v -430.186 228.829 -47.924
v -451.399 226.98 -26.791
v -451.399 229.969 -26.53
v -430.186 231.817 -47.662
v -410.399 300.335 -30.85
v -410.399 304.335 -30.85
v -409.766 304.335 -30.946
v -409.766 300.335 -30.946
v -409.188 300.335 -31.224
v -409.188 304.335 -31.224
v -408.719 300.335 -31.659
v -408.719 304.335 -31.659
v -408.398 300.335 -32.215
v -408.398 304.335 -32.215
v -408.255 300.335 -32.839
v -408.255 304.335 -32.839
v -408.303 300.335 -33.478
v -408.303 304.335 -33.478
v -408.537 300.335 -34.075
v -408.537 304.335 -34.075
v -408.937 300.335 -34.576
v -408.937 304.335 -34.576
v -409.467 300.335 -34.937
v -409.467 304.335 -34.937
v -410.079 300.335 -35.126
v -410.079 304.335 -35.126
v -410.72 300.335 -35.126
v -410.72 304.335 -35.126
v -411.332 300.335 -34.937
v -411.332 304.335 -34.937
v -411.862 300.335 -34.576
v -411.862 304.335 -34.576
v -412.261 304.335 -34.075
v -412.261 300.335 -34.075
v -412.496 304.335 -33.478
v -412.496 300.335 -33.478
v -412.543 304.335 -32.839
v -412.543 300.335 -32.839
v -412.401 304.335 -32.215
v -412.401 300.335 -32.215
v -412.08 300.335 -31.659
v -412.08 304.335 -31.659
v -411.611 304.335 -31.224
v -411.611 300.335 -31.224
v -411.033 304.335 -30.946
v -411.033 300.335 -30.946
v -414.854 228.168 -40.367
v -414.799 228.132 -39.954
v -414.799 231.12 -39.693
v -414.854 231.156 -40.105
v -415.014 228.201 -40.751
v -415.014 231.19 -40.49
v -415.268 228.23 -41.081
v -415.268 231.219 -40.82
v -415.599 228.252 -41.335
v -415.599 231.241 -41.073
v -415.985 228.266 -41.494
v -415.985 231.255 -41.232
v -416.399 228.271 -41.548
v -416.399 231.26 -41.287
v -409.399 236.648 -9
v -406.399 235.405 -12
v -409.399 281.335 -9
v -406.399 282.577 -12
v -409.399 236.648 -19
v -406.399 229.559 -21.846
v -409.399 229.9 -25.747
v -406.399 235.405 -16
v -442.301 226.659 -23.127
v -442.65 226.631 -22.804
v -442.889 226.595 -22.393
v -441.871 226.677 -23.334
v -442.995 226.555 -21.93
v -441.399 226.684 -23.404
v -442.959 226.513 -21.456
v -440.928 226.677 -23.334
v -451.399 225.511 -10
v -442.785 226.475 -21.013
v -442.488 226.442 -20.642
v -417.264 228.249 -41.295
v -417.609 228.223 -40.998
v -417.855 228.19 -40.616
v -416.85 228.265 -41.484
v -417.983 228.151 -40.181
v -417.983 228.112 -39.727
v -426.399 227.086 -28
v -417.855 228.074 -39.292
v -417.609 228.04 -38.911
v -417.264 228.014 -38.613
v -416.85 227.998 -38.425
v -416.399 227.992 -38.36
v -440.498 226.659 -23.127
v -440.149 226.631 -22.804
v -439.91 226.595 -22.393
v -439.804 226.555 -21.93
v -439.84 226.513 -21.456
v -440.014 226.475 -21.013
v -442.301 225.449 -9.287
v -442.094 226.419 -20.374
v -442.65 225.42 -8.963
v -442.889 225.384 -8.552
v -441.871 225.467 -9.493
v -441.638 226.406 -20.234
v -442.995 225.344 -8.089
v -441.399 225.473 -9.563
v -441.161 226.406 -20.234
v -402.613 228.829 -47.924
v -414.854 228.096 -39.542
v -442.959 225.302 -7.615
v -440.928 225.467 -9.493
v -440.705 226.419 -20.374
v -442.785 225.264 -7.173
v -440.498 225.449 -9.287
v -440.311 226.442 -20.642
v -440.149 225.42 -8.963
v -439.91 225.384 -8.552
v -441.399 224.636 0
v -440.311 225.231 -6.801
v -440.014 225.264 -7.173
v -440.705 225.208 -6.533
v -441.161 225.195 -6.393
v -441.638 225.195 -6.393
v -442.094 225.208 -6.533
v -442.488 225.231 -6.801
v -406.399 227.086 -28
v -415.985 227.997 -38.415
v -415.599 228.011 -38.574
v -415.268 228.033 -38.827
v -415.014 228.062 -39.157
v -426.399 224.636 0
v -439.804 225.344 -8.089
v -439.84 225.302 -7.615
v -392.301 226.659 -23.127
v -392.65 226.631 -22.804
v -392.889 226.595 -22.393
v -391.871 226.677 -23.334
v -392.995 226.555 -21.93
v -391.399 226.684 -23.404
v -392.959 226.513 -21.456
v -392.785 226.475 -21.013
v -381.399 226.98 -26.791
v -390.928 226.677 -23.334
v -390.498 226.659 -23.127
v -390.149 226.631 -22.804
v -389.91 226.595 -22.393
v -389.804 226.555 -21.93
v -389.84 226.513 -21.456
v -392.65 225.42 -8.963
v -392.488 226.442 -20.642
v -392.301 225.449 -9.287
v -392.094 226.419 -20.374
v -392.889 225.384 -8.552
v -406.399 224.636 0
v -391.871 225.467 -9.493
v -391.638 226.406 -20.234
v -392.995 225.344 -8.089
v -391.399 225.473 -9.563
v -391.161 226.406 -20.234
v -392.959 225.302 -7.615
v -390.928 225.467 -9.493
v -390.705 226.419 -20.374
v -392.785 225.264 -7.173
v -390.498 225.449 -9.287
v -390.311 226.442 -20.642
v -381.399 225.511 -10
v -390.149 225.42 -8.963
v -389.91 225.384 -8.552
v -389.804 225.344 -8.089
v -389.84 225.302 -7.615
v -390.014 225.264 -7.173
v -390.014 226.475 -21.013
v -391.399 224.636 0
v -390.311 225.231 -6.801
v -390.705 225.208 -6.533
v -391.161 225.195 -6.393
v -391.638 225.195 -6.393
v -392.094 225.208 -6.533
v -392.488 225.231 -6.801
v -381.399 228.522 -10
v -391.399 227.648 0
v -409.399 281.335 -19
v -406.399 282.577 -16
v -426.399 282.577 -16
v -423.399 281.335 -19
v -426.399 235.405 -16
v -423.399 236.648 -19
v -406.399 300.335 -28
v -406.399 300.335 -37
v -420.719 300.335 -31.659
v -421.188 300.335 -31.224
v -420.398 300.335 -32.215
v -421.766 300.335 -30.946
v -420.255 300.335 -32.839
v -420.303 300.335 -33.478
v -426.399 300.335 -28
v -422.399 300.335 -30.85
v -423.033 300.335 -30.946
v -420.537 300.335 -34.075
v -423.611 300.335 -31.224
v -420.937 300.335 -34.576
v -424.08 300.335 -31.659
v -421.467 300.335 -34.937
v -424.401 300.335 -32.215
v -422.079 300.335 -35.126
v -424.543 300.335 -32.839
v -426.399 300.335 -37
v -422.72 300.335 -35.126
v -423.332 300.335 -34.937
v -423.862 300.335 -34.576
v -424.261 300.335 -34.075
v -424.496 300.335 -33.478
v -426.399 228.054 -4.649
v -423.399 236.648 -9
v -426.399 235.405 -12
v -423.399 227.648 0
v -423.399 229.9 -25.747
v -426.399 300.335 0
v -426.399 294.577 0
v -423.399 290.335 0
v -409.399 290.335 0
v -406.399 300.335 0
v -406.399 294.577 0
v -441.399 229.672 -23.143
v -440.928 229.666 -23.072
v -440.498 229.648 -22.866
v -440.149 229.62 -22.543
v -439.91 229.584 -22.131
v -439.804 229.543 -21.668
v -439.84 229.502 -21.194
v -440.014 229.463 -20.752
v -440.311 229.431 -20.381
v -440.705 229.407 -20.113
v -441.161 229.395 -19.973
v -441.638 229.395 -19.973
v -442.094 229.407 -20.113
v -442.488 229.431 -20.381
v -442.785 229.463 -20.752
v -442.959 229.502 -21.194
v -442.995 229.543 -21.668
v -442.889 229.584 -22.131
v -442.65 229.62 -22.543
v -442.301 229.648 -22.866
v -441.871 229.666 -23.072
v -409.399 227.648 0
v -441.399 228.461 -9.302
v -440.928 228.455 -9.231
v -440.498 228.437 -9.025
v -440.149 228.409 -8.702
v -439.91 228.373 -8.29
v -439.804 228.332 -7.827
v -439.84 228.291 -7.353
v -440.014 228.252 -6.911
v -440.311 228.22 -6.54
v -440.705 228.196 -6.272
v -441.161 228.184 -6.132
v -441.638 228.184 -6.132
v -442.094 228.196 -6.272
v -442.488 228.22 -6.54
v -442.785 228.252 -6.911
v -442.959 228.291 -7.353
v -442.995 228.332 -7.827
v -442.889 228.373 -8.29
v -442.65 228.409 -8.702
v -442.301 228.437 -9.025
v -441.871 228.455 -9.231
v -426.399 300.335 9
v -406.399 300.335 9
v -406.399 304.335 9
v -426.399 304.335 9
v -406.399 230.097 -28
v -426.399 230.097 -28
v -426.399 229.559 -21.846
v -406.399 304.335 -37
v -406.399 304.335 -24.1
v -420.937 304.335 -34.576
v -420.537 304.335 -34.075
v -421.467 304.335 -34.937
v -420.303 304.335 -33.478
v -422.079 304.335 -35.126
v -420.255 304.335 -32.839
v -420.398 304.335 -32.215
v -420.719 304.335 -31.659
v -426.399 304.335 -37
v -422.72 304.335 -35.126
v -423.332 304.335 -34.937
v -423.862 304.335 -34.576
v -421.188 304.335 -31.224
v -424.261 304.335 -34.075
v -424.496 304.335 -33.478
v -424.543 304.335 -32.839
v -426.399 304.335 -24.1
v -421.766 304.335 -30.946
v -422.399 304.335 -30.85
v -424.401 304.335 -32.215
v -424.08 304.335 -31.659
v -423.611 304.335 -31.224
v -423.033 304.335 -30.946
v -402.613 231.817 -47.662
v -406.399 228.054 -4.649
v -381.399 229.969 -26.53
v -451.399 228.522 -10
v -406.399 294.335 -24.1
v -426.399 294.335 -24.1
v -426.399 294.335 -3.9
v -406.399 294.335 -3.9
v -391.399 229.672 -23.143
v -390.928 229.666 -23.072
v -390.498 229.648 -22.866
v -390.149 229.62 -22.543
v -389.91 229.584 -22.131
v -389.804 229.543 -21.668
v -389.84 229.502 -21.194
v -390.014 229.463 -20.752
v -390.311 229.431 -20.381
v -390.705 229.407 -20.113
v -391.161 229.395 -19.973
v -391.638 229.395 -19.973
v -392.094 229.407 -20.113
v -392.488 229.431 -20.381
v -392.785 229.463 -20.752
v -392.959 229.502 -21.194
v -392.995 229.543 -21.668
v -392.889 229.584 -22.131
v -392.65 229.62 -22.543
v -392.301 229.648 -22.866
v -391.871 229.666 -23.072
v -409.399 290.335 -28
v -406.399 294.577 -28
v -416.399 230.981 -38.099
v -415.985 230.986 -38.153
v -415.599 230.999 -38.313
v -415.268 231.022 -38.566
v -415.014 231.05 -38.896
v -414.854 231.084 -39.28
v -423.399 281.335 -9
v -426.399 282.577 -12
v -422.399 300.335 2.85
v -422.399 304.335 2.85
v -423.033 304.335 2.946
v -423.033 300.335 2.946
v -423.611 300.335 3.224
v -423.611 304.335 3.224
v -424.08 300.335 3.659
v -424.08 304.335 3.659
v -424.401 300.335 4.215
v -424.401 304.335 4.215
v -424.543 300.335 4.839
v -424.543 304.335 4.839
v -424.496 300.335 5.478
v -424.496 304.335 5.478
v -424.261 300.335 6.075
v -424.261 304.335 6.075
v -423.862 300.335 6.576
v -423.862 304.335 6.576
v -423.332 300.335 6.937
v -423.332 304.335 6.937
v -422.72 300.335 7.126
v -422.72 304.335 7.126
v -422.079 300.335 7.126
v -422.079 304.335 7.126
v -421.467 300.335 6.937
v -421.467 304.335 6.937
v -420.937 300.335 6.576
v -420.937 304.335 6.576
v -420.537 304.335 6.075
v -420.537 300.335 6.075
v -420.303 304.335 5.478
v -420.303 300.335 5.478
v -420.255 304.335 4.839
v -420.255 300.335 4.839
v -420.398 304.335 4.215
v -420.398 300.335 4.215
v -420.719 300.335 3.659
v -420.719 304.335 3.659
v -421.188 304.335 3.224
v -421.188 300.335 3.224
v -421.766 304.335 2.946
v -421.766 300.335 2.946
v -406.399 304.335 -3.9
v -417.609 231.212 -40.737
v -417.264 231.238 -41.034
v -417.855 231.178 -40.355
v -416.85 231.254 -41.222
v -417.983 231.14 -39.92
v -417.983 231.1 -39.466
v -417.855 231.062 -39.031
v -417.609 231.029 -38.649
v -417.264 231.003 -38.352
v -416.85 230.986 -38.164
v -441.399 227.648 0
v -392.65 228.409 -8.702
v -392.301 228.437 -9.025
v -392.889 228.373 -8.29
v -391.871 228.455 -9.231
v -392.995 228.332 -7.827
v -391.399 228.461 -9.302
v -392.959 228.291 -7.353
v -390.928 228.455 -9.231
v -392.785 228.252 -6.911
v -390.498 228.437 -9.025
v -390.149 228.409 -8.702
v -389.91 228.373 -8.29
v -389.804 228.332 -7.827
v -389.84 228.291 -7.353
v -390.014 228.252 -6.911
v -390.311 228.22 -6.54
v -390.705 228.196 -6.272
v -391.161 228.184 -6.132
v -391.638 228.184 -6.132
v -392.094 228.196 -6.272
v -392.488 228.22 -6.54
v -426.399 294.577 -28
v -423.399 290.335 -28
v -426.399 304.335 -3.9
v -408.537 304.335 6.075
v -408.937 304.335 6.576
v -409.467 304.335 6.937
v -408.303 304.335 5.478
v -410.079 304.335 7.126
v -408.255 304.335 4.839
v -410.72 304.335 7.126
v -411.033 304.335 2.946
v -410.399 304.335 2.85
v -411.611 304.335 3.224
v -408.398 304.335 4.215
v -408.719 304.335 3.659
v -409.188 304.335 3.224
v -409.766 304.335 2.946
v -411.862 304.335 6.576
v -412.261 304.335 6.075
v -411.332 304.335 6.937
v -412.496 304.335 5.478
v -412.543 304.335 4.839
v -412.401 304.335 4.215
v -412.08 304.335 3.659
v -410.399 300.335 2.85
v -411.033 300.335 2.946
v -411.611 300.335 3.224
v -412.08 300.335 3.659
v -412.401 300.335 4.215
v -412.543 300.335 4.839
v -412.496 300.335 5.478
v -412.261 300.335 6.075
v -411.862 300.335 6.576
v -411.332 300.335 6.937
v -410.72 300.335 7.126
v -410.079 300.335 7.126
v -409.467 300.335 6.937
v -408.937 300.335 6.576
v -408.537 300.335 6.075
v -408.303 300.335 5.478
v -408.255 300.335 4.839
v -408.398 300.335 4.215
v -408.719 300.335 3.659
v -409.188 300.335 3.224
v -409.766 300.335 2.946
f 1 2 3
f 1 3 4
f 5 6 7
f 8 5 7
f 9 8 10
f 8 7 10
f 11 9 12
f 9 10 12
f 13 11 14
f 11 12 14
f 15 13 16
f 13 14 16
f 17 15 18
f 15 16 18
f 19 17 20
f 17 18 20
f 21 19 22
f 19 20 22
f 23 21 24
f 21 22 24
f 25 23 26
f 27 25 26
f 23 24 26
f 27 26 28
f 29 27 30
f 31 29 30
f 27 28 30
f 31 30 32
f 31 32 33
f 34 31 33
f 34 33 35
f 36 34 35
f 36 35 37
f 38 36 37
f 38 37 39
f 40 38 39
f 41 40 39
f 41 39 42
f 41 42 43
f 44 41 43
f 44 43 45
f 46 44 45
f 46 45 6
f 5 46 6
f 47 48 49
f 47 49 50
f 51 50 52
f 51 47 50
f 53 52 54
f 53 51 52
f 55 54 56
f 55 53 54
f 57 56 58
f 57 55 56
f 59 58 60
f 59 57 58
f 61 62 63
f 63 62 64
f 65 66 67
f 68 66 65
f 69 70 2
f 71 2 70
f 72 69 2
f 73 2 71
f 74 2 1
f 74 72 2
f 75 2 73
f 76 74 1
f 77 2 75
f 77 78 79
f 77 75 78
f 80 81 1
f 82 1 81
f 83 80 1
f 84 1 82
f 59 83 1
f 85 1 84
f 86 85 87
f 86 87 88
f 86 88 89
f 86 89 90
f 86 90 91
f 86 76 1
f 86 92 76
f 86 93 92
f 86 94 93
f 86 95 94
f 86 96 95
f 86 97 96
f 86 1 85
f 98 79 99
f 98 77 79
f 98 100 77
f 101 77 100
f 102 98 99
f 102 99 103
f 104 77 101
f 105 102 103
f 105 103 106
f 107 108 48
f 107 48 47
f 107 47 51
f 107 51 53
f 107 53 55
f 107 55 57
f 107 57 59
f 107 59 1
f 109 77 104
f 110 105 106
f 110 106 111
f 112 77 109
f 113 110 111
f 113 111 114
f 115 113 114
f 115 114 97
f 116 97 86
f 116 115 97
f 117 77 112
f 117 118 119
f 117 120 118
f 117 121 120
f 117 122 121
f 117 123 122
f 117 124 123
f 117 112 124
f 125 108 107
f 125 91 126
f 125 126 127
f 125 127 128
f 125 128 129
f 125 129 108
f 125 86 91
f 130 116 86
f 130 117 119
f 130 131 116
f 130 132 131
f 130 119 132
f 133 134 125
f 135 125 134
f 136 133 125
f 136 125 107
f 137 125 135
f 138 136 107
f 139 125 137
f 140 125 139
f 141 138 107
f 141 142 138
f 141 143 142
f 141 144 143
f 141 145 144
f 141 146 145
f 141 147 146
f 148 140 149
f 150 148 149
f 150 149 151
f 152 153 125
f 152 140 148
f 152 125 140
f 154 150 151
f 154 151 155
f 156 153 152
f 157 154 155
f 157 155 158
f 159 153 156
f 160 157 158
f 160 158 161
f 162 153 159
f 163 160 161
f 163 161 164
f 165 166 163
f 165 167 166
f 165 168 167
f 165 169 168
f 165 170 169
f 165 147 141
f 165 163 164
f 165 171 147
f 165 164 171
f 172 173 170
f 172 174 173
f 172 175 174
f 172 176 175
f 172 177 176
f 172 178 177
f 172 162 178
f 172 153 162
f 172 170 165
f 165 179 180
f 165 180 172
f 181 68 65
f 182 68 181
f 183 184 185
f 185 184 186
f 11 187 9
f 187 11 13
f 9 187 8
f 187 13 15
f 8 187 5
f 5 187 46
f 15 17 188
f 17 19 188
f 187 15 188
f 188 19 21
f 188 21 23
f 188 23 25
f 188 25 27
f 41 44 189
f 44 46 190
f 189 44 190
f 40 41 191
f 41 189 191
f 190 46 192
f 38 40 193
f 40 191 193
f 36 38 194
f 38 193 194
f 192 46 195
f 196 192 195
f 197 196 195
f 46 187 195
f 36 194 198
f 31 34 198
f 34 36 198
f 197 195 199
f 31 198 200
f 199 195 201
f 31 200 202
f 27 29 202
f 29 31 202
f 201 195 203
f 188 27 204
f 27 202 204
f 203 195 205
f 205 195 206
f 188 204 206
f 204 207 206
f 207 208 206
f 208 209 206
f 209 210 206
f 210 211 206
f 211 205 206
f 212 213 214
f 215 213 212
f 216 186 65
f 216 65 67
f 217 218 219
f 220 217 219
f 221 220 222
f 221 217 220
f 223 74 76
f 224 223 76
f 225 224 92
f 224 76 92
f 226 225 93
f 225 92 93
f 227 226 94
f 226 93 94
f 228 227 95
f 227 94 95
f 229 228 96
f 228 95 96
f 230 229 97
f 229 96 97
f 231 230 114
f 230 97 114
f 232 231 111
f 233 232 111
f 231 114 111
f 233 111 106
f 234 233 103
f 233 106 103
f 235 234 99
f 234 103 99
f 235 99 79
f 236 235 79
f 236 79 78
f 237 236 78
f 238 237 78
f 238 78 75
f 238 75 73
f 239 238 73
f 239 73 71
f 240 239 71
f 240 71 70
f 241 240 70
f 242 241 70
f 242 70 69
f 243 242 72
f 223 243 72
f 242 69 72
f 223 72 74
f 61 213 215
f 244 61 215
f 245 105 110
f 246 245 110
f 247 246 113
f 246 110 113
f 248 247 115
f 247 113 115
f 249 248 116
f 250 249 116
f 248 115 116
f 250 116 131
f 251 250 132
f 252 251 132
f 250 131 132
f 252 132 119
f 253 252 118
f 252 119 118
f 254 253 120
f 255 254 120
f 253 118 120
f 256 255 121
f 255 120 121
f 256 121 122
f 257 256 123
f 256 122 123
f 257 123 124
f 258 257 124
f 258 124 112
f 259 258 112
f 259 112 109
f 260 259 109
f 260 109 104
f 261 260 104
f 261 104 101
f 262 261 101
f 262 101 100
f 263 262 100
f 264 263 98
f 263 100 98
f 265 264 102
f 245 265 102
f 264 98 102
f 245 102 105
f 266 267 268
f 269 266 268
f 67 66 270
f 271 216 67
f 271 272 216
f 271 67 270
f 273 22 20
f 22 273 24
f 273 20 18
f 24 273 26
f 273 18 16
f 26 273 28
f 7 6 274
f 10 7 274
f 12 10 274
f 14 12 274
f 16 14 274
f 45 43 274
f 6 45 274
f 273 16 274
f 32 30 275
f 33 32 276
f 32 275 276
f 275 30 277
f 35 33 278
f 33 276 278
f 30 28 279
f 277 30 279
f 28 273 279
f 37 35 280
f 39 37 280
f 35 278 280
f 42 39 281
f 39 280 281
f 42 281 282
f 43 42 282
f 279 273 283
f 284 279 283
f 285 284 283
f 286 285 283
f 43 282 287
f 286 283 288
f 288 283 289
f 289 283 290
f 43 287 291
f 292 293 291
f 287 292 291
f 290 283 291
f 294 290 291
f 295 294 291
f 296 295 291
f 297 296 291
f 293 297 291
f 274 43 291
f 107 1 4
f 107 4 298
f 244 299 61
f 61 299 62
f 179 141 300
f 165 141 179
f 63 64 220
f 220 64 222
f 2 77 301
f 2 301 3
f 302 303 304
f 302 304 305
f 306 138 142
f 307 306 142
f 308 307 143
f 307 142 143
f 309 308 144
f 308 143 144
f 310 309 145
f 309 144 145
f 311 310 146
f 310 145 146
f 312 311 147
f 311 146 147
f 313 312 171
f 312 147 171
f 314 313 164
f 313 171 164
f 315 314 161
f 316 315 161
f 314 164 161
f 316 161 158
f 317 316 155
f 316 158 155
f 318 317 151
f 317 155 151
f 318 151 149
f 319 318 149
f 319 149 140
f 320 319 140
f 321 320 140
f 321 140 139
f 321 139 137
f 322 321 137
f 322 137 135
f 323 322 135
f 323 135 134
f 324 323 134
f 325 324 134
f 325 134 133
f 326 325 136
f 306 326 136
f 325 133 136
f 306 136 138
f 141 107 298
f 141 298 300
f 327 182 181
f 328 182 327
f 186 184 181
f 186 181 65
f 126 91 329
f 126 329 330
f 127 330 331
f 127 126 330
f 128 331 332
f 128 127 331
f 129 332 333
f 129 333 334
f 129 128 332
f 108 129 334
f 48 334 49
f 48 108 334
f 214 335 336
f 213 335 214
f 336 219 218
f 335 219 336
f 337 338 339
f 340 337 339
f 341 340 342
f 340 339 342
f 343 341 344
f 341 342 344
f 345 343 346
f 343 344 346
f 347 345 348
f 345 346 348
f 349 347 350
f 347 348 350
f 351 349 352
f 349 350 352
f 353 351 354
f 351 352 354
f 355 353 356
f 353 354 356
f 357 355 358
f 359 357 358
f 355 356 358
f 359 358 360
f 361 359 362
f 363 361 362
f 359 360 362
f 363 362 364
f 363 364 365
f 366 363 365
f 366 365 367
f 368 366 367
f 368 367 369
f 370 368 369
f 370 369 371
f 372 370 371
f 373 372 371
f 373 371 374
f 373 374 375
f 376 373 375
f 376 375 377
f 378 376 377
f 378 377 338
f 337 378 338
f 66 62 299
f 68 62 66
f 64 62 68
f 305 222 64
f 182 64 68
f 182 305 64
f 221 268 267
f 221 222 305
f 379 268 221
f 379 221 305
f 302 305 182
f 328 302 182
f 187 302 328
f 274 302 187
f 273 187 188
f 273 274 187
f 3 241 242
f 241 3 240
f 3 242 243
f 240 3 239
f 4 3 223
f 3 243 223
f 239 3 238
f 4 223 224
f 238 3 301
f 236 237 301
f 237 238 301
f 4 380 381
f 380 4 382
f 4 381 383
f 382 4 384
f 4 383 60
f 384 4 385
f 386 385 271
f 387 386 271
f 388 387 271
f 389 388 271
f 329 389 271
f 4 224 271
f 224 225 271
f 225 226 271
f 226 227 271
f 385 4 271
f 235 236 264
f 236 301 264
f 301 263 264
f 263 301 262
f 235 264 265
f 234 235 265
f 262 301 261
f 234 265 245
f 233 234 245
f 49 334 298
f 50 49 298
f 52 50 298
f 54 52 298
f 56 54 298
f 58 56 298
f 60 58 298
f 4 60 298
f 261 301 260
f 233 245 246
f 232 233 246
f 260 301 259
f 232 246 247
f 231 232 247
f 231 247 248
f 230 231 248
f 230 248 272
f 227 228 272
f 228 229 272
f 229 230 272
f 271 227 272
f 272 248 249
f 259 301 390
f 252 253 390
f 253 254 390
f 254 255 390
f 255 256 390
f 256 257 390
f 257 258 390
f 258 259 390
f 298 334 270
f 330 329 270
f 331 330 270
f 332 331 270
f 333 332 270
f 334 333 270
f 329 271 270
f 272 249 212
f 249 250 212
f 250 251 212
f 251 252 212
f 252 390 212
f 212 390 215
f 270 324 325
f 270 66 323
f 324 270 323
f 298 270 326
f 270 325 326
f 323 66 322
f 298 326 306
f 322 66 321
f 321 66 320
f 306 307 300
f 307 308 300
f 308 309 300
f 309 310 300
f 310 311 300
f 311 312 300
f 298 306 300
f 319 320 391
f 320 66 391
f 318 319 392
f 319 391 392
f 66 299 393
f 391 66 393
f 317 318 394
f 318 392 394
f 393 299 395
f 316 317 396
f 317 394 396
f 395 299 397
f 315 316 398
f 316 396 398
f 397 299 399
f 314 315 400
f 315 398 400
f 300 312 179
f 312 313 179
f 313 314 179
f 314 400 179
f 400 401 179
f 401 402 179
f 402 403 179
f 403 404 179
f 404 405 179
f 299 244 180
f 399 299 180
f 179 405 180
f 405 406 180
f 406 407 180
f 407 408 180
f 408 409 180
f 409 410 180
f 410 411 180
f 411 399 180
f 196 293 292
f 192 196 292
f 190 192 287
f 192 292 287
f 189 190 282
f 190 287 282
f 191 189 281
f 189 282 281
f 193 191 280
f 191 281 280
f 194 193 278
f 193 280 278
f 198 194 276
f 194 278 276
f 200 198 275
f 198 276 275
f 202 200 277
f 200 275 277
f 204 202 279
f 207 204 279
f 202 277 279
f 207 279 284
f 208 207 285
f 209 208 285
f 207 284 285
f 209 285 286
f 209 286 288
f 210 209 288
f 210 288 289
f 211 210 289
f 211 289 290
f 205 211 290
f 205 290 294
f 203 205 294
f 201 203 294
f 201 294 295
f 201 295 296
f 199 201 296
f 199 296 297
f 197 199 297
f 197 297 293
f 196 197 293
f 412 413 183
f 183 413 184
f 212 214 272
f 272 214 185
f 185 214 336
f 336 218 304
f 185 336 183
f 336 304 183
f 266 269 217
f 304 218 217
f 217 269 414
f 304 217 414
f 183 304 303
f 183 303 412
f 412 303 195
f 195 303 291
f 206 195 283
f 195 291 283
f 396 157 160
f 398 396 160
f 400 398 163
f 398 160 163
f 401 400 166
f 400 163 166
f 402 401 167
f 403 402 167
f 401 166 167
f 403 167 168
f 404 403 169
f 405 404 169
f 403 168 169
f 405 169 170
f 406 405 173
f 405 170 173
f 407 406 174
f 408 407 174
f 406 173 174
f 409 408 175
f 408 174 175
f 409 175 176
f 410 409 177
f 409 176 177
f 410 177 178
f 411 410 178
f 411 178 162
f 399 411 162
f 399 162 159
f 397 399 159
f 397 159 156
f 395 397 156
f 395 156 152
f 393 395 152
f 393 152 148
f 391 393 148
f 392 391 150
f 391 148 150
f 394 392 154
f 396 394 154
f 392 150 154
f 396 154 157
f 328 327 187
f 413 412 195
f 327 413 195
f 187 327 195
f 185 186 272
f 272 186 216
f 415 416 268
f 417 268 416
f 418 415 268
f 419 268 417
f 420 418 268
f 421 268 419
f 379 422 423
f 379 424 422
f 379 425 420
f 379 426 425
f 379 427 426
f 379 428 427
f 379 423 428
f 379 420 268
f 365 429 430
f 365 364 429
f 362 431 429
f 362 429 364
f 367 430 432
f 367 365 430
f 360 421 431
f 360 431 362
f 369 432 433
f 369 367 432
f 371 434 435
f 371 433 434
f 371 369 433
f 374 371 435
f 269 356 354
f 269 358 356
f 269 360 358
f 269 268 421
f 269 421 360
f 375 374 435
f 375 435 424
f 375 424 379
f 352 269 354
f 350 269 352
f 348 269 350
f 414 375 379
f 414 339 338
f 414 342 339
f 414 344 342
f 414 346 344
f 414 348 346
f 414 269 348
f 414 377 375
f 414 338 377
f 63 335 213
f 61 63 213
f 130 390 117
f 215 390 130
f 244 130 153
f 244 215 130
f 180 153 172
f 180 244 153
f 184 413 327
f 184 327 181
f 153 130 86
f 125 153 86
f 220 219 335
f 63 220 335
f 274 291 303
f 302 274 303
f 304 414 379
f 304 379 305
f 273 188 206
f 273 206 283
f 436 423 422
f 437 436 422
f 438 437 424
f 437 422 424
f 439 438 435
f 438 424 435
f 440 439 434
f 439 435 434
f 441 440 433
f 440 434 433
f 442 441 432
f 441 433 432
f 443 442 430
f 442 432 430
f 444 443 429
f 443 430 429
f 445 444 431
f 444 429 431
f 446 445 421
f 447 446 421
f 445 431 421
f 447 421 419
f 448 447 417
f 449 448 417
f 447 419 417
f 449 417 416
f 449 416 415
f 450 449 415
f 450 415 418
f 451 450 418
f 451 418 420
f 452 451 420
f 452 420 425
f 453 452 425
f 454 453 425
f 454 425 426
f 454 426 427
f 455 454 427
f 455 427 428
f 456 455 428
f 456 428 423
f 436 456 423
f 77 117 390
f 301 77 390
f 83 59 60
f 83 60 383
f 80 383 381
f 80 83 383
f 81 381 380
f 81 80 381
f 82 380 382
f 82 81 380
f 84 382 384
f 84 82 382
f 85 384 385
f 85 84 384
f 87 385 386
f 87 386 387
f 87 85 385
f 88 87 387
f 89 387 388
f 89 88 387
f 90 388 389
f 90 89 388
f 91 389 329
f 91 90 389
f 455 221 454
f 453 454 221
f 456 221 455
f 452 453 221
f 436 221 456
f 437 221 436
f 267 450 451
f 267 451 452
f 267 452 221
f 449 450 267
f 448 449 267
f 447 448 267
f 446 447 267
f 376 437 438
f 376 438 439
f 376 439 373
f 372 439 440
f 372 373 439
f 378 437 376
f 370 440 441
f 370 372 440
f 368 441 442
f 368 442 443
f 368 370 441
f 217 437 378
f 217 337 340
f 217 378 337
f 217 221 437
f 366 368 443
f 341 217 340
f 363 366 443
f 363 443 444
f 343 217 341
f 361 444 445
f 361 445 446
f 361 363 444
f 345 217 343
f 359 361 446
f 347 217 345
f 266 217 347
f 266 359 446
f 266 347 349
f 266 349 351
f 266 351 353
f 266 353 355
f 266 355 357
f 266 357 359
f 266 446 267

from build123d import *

# Parameters (mm, degrees)
SKETCH1_W           = 20
SKETCH1_H           = 53.344530479
BOSS_EXTRUDE1_DEPTH = 28
BOSS_EXTRUDE2_START = -426.399445517
BOSS_EXTRUDE2_DEPTH = 20
BOSS_EXTRUDE3_DEPTH = 20
SKETCH4_R           = 2.15
CUT_EXTRUDE1_DEPTH  = 10
SKETCH6_R           = 1.6
BOSS_EXTRUDE5_DEPTH = 3
SKETCH7_W           = 104.374043795
SKETCH7_H           = 16.644454458
CUT_EXTRUDE2_DEPTH  = 3
CHAMFER1_SIZE       = 10
CUT_EXTRUDE3_DEPTH  = 60
CHAMFER2_SIZE       = 3


# Read off the part's stored shape, not the designer's step: Boss-Extrude2
with BuildPart() as part:
    # Sketch1 → Boss-Extrude1 (new body)
    with BuildSketch(Plane.XY):
        with Locations((-416.399445517, 267.662547877)):
            Rectangle(SKETCH1_W, SKETCH1_H)
    extrude(amount=-BOSS_EXTRUDE1_DEPTH)

    # Boss-Extrude2 outline → Boss-Extrude2 (add)
    with BuildSketch(Plane.YZ.offset(BOSS_EXTRUDE2_START)):
        Polygon((227.085747643, -28), (240.990282637, -28), (240.990282637, 0), (224.636065064, 0), align=None)
    extrude(amount=BOSS_EXTRUDE2_DEPTH)

    # Sketch3 → Boss-Extrude3 (add)
    with BuildSketch(Plane.ZY.offset(426.399445517)):
        Polygon((-28, 300.334813116), (-37, 300.334813116), (-37, 304.334813116), (-24.1, 304.334813116), (-24.1, 294.334813116), (-28, 294.334813116), align=None)
        Polygon((9, 300.334813116), (9, 304.334813116), (-3.9, 304.334813116), (-3.9, 294.334813116), (0, 294.334813116), (0, 300.334813116), align=None)
    extrude(amount=-BOSS_EXTRUDE3_DEPTH)

    # Sketch4 → Cut-Extrude1 (cut)
    with BuildSketch(Plane(origin=(0, 304.334813116, 0), x_dir=(1, 0, 0), z_dir=(0, 1, 0))):
        with Locations(Location((-422.399445517, 33, 0), (0, 0, 270))):
            Circle(SKETCH4_R)
        with Locations(Location((-410.399445517, 33, 0), (0, 0, 270))):
            Circle(SKETCH4_R)
        with Locations(Location((-410.399445517, -5, 0), (0, 0, 90))):
            Circle(SKETCH4_R)
        with Locations(Location((-422.399445517, -5, 0), (0, 0, 90))):
            Circle(SKETCH4_R)
    extrude(amount=-CUT_EXTRUDE1_DEPTH, mode=Mode.SUBTRACT)

    # Sketch6 → Boss-Extrude5 (add)
    # profile 1 of 2: a face of its own
    with BuildSketch(Plane(origin=(0, 222.929701773, 19.503821668), x_dir=(1, 0, 0), z_dir=(0, -0.9961946980917453, -0.087155742747662))):
        with BuildLine():
            Line((-426.399445517, -19.578323099), (-451.399445517, -19.578323099))
            Line((-451.399445517, -19.578323099), (-451.399445517, -46.472075114))
            Line((-451.399445517, -46.472075114), (-430.186242082, -67.68527855))
            Line((-430.186242082, -67.68527855), (-416.399445517, -67.68527855))
            Line((-416.399445517, -67.68527855), (-416.399445517, -61.28527855))
            ThreePointArc((-416.399445517, -61.28527855), (-417.999445517, -59.68527855), (-416.399445517, -58.08527855))
            Line((-416.399445517, -58.08527855), (-416.399445517, -47.68527855))
            Line((-416.399445517, -47.68527855), (-426.399445517, -47.68527855))
            Line((-426.399445517, -47.68527855), (-426.399445517, -19.578323099))
        make_face()
        with Locations(Location((-441.399445517, -41.472075114, 0), (0, 0, 270))):
            Circle(SKETCH6_R, mode=Mode.SUBTRACT)
        with Locations(Location((-441.399445517, -27.578323099, 0), (0, 0, 270))):
            Circle(SKETCH6_R, mode=Mode.SUBTRACT)
    # profile 2 of 2: a face of its own
    with BuildSketch(Plane(origin=(0, 222.929701773, 19.503821668), x_dir=(1, 0, 0), z_dir=(0, -0.9961946980917453, -0.087155742747662))):
        with BuildLine():
            Line((-416.399445517, -61.28527855), (-416.399445517, -67.68527855))
            Line((-416.399445517, -67.68527855), (-402.612648953, -67.68527855))
            Line((-402.612648953, -67.68527855), (-381.399445517, -46.472075114))
            Line((-381.399445517, -46.472075114), (-381.399445517, -19.578323099))
            Line((-381.399445517, -19.578323099), (-406.399445517, -19.578323099))
            Line((-406.399445517, -19.578323099), (-406.399445517, -47.68527855))
            Line((-406.399445517, -47.68527855), (-416.399445517, -47.68527855))
            Line((-416.399445517, -47.68527855), (-416.399445517, -58.08527855))
            ThreePointArc((-416.399445517, -58.08527855), (-415.268074667, -58.5539077), (-414.799445517, -59.68527855))
            ThreePointArc((-414.799445517, -59.68527855), (-415.268074667, -60.8166494), (-416.399445517, -61.28527855))
        make_face()
        with Locations(Location((-391.399445517, -41.472075114, 0), (0, 0, 270))):
            Circle(SKETCH6_R, mode=Mode.SUBTRACT)
        with Locations(Location((-391.399445517, -27.578323099, 0), (0, 0, 270))):
            Circle(SKETCH6_R, mode=Mode.SUBTRACT)
    extrude(amount=-BOSS_EXTRUDE5_DEPTH)

    # Sketch7 → Cut-Extrude2 (cut)
    with BuildSketch(Plane.XY):
        with Locations((-415.627785026, 222.829224709)):
            Rectangle(SKETCH7_W, SKETCH7_H)
    extrude(amount=CUT_EXTRUDE2_DEPTH, mode=Mode.SUBTRACT)

    # Chamfer1
    chamfer1_edges = [part.edges().sort_by_distance(p)[0] for p in [
        (-451.399445517, 226.141794821, 0),
        (-381.399445517, 226.141794821, 0),
    ]]
    chamfer(chamfer1_edges, length=CHAMFER1_SIZE)

    # Sketch8 → Cut-Extrude3 (cut)
    with BuildSketch(Plane.ZY.offset(426.399445517)):
        Polygon((-28, 290.334813116), (-19, 281.334813116), (-19, 236.647524577), (-25.747394836, 229.90012974), (-28, 230.097207156), align=None)
        Polygon((0, 290.334813116), (-9, 281.334813116), (-9, 236.647524577), (0, 227.647524577), align=None)
    extrude(amount=-CUT_EXTRUDE3_DEPTH, mode=Mode.SUBTRACT)

    # Chamfer2
    chamfer2_edges = [part.edges().sort_by_distance(p)[0] for p in [
        (-406.399445517, 258.991168846, -9),
        (-406.399445517, 258.991168846, -19),
        (-406.399445517, 285.834813116, -23.5),
        (-406.399445517, 233.273827159, -22.373697418),
        (-426.399445517, 233.273827159, -22.373697418),
        (-426.399445517, 258.991168846, -19),
        (-426.399445517, 285.834813116, -23.5),
        (-406.399445517, 285.834813116, -4.5),
        (-406.399445517, 232.147524577, -4.5),
        (-426.399445517, 285.834813116, -4.5),
        (-426.399445517, 258.991168846, -9),
        (-426.399445517, 232.147524577, -4.5),
    ]]
    chamfer(chamfer2_edges, length=CHAMFER2_SIZE)


solid = part.part
